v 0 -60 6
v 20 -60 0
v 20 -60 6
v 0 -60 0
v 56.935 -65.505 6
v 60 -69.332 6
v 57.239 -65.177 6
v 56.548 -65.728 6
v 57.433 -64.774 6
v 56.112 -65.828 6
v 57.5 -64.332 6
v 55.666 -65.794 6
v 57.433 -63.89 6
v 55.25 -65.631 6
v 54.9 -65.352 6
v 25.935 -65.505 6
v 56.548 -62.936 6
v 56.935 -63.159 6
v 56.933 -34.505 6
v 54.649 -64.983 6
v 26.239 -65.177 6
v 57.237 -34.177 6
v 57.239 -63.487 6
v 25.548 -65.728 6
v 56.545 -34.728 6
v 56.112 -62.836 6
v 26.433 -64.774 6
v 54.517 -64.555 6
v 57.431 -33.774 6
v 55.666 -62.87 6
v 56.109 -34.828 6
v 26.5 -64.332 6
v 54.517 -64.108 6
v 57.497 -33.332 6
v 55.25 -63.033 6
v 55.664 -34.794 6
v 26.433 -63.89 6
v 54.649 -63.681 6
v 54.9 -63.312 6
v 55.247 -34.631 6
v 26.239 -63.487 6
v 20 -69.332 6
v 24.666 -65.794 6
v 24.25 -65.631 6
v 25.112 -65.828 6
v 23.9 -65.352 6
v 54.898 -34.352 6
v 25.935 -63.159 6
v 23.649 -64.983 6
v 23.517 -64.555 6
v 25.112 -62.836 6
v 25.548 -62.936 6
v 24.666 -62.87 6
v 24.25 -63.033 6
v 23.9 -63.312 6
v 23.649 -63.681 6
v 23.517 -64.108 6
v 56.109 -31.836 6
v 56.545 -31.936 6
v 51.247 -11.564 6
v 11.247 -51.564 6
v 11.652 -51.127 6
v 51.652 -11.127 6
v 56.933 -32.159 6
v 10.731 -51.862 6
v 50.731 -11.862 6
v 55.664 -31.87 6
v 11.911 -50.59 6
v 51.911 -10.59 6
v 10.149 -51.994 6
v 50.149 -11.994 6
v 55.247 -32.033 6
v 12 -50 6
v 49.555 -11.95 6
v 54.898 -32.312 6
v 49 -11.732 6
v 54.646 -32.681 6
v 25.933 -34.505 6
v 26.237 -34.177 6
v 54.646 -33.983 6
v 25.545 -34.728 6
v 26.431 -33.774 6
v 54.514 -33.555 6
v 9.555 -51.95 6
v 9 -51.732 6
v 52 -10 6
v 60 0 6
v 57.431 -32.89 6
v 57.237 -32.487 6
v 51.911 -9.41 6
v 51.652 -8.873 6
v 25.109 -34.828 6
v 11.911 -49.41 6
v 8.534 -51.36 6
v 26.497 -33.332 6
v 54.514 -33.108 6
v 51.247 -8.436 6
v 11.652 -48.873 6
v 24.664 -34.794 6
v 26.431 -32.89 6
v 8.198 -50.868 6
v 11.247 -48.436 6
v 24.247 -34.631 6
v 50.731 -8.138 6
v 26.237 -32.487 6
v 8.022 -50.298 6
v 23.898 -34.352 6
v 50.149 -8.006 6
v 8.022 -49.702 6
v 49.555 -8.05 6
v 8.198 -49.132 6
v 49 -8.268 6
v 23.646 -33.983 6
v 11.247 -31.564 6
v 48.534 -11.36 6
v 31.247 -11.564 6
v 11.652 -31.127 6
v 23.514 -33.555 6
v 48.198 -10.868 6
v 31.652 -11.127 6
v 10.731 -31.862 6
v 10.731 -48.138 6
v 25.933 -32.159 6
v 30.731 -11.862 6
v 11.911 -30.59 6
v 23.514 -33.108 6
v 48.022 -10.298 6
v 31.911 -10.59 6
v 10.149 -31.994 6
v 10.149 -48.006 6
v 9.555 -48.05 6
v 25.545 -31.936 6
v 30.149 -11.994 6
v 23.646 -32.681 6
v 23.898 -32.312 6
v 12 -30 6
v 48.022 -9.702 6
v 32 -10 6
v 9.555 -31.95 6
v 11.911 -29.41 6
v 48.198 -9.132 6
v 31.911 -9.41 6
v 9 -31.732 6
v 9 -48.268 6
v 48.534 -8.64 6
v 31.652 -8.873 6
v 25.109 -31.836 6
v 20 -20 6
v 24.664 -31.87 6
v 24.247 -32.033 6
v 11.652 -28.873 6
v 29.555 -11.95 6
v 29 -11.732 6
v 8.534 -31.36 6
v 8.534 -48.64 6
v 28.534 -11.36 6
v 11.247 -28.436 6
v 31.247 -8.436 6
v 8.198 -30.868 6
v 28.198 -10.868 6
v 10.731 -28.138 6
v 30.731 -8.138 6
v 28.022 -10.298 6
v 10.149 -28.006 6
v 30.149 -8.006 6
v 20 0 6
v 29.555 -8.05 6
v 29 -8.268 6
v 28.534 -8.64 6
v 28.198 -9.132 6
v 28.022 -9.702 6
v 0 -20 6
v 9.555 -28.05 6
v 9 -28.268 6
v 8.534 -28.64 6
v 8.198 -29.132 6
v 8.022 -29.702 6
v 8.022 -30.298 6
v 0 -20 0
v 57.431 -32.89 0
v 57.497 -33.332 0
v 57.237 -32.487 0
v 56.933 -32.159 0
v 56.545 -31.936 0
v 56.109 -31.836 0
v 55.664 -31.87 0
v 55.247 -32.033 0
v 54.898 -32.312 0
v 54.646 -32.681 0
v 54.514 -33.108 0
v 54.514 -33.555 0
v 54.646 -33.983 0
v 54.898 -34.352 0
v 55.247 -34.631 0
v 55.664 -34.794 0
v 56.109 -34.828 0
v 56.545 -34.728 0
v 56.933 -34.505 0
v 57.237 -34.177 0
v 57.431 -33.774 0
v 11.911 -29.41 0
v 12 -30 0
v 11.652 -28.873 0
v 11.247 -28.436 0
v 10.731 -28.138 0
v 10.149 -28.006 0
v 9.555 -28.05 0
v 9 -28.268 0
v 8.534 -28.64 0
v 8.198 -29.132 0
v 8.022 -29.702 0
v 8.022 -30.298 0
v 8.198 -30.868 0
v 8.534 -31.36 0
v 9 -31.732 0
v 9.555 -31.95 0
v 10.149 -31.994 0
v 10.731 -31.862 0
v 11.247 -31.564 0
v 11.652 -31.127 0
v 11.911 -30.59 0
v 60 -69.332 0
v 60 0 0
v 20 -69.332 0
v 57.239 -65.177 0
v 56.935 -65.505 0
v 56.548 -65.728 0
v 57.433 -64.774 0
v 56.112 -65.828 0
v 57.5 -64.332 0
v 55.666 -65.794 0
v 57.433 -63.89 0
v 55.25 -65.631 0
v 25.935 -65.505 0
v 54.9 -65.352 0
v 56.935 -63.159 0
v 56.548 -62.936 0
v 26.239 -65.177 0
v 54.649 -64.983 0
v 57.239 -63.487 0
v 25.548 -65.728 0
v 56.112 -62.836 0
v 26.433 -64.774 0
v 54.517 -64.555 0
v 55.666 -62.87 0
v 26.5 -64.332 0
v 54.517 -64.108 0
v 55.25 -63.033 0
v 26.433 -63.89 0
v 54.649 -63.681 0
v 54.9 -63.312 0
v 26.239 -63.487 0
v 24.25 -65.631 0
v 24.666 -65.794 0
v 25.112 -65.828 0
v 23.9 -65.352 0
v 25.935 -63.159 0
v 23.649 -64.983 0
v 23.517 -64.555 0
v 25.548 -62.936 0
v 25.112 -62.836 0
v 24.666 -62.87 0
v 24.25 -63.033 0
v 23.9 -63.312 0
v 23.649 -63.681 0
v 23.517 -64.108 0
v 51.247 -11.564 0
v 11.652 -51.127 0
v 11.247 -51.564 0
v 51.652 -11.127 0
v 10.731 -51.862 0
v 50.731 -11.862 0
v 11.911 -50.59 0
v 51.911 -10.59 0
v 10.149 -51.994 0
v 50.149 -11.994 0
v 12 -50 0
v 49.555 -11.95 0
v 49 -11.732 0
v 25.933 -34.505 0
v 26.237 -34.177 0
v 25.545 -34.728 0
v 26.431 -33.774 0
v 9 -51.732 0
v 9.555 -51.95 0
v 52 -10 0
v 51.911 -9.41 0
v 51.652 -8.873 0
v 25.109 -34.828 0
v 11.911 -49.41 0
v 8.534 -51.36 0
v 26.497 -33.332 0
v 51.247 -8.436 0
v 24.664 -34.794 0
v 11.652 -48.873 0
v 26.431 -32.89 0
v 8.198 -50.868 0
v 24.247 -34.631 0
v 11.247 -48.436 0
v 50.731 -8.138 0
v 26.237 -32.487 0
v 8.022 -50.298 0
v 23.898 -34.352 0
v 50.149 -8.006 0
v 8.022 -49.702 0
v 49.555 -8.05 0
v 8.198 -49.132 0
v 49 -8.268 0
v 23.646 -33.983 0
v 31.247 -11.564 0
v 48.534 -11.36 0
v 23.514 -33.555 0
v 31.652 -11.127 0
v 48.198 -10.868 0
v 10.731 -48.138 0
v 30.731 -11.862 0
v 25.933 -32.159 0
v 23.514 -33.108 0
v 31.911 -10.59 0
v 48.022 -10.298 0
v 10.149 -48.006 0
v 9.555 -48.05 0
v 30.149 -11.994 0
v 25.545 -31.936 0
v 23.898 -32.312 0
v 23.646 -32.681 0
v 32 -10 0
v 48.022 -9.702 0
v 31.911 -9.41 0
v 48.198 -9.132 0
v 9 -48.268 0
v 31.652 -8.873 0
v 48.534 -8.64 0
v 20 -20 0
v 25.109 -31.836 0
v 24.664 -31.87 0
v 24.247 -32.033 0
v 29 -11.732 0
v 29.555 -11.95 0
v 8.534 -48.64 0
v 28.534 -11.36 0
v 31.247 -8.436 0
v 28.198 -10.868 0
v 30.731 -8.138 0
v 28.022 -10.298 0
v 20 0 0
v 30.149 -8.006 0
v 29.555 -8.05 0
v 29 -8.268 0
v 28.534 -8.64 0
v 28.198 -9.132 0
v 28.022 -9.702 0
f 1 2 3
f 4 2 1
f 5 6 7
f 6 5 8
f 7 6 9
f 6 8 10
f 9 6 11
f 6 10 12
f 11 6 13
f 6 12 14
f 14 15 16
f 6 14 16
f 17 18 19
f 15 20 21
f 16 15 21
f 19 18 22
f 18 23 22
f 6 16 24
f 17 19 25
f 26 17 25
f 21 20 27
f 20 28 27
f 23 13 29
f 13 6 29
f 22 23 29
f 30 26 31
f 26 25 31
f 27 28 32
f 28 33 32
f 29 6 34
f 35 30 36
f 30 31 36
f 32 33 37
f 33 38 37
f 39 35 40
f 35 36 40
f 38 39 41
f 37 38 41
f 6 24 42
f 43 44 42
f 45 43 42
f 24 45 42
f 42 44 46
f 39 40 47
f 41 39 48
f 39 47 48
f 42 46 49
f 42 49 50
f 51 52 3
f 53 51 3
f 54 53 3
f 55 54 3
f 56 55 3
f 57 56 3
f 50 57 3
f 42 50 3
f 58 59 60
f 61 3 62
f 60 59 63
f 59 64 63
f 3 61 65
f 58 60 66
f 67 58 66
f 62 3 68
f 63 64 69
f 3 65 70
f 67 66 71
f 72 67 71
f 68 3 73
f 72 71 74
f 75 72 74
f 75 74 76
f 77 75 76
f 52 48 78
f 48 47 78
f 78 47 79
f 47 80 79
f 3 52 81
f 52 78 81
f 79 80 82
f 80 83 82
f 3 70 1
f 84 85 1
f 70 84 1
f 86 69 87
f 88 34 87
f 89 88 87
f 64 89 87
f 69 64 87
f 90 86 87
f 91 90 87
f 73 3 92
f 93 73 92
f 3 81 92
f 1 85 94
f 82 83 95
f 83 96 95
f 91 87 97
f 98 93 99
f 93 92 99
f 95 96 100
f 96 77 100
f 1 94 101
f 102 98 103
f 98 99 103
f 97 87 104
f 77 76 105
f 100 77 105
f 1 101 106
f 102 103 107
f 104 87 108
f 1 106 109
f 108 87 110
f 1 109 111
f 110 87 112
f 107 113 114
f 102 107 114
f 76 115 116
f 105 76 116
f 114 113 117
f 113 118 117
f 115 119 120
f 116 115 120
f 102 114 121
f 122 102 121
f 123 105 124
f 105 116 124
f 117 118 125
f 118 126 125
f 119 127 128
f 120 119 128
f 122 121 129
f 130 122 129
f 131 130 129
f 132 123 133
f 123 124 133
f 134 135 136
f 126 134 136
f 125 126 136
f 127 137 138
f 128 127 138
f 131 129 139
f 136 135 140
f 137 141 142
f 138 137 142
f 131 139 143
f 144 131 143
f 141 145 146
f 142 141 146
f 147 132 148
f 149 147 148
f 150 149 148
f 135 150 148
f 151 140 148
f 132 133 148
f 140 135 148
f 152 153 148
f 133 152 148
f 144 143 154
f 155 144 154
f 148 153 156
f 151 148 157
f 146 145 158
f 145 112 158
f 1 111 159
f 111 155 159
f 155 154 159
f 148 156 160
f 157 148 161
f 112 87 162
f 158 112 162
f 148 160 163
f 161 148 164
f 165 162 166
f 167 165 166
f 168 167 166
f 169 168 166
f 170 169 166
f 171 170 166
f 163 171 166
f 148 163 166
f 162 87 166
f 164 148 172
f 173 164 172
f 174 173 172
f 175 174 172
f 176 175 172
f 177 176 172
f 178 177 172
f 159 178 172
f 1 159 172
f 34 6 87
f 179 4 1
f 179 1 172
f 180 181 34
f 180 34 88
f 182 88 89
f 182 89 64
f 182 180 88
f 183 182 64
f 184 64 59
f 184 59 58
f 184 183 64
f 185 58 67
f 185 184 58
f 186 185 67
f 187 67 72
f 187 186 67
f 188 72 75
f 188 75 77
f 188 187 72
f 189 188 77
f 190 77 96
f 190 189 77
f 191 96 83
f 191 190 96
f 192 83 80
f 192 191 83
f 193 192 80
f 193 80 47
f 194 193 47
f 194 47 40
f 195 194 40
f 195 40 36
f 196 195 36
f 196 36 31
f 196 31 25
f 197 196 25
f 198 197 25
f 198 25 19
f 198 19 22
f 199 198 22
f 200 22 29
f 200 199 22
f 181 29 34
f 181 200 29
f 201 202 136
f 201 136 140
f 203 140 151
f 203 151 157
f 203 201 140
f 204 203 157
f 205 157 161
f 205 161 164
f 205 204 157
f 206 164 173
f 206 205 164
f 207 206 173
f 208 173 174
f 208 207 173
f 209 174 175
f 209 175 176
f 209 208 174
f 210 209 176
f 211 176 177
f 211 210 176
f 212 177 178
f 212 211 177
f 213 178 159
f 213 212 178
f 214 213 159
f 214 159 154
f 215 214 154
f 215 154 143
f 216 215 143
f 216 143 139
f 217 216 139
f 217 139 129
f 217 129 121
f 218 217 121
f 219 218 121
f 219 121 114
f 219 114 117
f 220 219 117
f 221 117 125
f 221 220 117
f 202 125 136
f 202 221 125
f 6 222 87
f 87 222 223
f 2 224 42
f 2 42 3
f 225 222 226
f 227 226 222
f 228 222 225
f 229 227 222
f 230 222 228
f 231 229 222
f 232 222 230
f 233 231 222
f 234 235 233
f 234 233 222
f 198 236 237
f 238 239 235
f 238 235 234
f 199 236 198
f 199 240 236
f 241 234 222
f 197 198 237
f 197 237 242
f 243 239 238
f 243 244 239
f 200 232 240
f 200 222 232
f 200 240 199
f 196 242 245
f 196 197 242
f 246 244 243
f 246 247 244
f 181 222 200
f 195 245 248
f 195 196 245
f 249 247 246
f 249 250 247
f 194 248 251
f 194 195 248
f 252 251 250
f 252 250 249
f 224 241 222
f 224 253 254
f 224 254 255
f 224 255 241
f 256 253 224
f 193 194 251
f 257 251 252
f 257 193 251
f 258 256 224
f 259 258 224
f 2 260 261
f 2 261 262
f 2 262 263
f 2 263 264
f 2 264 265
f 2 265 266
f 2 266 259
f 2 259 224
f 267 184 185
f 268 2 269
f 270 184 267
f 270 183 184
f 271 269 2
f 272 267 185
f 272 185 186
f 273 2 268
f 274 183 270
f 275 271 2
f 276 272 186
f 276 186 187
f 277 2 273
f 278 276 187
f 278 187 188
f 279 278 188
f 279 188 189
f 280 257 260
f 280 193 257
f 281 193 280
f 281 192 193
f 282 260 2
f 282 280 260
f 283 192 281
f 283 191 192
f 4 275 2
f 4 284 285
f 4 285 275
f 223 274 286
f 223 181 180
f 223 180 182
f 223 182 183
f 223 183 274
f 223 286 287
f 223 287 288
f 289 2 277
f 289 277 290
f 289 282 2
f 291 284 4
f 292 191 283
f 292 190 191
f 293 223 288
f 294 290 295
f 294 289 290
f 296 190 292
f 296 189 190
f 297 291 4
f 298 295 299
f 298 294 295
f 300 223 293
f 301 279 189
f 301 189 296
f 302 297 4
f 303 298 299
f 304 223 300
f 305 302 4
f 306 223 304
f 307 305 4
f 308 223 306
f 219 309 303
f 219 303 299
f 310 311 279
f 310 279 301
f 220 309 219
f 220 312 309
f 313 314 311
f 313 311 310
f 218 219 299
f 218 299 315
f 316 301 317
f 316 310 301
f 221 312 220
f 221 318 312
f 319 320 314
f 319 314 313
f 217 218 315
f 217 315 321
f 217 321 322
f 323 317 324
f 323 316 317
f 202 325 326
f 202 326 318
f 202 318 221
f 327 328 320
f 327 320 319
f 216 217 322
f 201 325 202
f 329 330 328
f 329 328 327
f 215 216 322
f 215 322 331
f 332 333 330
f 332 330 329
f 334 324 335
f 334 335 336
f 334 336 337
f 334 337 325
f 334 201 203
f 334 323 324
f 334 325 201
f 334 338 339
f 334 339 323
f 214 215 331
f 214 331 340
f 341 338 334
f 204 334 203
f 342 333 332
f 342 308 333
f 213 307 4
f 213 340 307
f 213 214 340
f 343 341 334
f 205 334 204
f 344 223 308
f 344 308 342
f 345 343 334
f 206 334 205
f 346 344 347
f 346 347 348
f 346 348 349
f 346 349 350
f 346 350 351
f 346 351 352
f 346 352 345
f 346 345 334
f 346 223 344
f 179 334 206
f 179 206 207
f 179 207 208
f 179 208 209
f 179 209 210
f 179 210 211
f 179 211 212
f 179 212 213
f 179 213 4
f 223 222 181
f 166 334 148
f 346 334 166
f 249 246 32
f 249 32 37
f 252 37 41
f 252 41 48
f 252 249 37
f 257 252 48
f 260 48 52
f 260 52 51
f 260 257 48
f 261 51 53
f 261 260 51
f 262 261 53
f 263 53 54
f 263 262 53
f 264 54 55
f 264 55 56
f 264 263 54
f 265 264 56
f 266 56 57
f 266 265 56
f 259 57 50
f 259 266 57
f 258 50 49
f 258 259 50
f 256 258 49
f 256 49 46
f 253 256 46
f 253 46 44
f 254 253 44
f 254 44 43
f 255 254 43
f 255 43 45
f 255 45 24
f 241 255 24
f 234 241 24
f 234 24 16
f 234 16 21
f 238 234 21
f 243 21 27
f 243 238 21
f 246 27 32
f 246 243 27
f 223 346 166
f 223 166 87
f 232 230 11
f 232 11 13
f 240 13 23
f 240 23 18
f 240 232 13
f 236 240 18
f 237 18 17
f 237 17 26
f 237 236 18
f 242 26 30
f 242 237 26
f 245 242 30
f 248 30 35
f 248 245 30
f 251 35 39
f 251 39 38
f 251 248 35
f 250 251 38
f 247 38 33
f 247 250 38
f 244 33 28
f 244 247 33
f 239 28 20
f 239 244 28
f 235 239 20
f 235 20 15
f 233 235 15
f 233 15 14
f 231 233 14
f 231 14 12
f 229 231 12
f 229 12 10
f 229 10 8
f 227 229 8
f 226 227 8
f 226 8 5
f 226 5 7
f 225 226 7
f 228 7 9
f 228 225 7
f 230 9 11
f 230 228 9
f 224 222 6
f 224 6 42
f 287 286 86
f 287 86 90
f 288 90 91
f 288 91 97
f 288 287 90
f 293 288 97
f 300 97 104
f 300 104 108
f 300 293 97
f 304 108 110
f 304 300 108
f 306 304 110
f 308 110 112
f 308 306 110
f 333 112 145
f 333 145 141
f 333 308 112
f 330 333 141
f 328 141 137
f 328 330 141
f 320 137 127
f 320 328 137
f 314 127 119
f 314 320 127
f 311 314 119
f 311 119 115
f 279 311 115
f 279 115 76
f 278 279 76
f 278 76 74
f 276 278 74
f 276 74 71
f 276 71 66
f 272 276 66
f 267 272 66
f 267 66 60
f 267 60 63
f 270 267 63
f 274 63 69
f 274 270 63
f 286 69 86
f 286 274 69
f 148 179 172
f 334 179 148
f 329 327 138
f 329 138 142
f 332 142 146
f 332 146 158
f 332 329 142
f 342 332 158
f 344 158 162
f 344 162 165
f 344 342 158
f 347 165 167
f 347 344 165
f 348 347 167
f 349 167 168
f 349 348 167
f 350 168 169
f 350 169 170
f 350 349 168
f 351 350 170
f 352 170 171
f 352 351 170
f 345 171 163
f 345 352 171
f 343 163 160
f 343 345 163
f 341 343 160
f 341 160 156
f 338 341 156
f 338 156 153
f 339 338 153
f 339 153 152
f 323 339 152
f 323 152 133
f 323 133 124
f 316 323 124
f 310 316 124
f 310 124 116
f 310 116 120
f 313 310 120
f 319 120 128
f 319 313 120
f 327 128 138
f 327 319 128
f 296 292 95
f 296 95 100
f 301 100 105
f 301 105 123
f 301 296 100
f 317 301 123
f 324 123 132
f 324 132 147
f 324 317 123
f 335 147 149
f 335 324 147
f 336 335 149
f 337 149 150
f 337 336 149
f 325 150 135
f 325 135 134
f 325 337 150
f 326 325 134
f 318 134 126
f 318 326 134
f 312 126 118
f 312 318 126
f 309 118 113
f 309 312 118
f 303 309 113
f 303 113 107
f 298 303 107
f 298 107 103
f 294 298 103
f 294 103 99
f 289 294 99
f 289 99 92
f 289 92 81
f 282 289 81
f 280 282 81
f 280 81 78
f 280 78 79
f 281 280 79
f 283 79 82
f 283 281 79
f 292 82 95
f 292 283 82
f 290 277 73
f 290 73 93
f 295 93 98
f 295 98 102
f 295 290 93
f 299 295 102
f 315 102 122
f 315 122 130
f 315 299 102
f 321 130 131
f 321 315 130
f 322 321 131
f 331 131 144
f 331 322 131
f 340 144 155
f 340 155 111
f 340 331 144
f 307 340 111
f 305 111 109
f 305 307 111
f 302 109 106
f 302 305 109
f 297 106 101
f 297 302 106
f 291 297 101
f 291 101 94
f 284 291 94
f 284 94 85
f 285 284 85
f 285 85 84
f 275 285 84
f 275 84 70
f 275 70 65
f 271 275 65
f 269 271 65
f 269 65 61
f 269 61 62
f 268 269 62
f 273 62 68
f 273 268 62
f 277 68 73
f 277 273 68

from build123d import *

# Parameters (mm, degrees)
SKETCH1_R           = 2
SKETCH1_R_2         = 1.5
BOSS_EXTRUDE1_DEPTH = 6


with BuildPart() as part:
    # Sketch1 → Boss-Extrude1 (new body)
    with BuildSketch(Plane.XY):
        Polygon((20, 0), (60, 0), (60, -20), (60, -69.331923123), (20, -69.331923123), (20, -60), (0, -60), (0, -20), (20, -20), align=None)
        with Locations((50, -10)):
            Circle(SKETCH1_R, mode=Mode.SUBTRACT)
        with Locations((30, -10)):
            Circle(SKETCH1_R, mode=Mode.SUBTRACT)
        with Locations((10, -50)):
            Circle(SKETCH1_R, mode=Mode.SUBTRACT)
        with Locations((10, -30)):
            Circle(SKETCH1_R, mode=Mode.SUBTRACT)
        with Locations((25, -64.331923123)):
            Circle(SKETCH1_R_2, mode=Mode.SUBTRACT)
        with Locations((24.997348671, -33.331923237)):
            Circle(SKETCH1_R_2, mode=Mode.SUBTRACT)
        with Locations((56, -64.331923123)):
            Circle(SKETCH1_R_2, mode=Mode.SUBTRACT)
        with Locations((55.997348671, -33.331923123)):
            Circle(SKETCH1_R_2, mode=Mode.SUBTRACT)
    extrude(amount=BOSS_EXTRUDE1_DEPTH)


solid = part.part
